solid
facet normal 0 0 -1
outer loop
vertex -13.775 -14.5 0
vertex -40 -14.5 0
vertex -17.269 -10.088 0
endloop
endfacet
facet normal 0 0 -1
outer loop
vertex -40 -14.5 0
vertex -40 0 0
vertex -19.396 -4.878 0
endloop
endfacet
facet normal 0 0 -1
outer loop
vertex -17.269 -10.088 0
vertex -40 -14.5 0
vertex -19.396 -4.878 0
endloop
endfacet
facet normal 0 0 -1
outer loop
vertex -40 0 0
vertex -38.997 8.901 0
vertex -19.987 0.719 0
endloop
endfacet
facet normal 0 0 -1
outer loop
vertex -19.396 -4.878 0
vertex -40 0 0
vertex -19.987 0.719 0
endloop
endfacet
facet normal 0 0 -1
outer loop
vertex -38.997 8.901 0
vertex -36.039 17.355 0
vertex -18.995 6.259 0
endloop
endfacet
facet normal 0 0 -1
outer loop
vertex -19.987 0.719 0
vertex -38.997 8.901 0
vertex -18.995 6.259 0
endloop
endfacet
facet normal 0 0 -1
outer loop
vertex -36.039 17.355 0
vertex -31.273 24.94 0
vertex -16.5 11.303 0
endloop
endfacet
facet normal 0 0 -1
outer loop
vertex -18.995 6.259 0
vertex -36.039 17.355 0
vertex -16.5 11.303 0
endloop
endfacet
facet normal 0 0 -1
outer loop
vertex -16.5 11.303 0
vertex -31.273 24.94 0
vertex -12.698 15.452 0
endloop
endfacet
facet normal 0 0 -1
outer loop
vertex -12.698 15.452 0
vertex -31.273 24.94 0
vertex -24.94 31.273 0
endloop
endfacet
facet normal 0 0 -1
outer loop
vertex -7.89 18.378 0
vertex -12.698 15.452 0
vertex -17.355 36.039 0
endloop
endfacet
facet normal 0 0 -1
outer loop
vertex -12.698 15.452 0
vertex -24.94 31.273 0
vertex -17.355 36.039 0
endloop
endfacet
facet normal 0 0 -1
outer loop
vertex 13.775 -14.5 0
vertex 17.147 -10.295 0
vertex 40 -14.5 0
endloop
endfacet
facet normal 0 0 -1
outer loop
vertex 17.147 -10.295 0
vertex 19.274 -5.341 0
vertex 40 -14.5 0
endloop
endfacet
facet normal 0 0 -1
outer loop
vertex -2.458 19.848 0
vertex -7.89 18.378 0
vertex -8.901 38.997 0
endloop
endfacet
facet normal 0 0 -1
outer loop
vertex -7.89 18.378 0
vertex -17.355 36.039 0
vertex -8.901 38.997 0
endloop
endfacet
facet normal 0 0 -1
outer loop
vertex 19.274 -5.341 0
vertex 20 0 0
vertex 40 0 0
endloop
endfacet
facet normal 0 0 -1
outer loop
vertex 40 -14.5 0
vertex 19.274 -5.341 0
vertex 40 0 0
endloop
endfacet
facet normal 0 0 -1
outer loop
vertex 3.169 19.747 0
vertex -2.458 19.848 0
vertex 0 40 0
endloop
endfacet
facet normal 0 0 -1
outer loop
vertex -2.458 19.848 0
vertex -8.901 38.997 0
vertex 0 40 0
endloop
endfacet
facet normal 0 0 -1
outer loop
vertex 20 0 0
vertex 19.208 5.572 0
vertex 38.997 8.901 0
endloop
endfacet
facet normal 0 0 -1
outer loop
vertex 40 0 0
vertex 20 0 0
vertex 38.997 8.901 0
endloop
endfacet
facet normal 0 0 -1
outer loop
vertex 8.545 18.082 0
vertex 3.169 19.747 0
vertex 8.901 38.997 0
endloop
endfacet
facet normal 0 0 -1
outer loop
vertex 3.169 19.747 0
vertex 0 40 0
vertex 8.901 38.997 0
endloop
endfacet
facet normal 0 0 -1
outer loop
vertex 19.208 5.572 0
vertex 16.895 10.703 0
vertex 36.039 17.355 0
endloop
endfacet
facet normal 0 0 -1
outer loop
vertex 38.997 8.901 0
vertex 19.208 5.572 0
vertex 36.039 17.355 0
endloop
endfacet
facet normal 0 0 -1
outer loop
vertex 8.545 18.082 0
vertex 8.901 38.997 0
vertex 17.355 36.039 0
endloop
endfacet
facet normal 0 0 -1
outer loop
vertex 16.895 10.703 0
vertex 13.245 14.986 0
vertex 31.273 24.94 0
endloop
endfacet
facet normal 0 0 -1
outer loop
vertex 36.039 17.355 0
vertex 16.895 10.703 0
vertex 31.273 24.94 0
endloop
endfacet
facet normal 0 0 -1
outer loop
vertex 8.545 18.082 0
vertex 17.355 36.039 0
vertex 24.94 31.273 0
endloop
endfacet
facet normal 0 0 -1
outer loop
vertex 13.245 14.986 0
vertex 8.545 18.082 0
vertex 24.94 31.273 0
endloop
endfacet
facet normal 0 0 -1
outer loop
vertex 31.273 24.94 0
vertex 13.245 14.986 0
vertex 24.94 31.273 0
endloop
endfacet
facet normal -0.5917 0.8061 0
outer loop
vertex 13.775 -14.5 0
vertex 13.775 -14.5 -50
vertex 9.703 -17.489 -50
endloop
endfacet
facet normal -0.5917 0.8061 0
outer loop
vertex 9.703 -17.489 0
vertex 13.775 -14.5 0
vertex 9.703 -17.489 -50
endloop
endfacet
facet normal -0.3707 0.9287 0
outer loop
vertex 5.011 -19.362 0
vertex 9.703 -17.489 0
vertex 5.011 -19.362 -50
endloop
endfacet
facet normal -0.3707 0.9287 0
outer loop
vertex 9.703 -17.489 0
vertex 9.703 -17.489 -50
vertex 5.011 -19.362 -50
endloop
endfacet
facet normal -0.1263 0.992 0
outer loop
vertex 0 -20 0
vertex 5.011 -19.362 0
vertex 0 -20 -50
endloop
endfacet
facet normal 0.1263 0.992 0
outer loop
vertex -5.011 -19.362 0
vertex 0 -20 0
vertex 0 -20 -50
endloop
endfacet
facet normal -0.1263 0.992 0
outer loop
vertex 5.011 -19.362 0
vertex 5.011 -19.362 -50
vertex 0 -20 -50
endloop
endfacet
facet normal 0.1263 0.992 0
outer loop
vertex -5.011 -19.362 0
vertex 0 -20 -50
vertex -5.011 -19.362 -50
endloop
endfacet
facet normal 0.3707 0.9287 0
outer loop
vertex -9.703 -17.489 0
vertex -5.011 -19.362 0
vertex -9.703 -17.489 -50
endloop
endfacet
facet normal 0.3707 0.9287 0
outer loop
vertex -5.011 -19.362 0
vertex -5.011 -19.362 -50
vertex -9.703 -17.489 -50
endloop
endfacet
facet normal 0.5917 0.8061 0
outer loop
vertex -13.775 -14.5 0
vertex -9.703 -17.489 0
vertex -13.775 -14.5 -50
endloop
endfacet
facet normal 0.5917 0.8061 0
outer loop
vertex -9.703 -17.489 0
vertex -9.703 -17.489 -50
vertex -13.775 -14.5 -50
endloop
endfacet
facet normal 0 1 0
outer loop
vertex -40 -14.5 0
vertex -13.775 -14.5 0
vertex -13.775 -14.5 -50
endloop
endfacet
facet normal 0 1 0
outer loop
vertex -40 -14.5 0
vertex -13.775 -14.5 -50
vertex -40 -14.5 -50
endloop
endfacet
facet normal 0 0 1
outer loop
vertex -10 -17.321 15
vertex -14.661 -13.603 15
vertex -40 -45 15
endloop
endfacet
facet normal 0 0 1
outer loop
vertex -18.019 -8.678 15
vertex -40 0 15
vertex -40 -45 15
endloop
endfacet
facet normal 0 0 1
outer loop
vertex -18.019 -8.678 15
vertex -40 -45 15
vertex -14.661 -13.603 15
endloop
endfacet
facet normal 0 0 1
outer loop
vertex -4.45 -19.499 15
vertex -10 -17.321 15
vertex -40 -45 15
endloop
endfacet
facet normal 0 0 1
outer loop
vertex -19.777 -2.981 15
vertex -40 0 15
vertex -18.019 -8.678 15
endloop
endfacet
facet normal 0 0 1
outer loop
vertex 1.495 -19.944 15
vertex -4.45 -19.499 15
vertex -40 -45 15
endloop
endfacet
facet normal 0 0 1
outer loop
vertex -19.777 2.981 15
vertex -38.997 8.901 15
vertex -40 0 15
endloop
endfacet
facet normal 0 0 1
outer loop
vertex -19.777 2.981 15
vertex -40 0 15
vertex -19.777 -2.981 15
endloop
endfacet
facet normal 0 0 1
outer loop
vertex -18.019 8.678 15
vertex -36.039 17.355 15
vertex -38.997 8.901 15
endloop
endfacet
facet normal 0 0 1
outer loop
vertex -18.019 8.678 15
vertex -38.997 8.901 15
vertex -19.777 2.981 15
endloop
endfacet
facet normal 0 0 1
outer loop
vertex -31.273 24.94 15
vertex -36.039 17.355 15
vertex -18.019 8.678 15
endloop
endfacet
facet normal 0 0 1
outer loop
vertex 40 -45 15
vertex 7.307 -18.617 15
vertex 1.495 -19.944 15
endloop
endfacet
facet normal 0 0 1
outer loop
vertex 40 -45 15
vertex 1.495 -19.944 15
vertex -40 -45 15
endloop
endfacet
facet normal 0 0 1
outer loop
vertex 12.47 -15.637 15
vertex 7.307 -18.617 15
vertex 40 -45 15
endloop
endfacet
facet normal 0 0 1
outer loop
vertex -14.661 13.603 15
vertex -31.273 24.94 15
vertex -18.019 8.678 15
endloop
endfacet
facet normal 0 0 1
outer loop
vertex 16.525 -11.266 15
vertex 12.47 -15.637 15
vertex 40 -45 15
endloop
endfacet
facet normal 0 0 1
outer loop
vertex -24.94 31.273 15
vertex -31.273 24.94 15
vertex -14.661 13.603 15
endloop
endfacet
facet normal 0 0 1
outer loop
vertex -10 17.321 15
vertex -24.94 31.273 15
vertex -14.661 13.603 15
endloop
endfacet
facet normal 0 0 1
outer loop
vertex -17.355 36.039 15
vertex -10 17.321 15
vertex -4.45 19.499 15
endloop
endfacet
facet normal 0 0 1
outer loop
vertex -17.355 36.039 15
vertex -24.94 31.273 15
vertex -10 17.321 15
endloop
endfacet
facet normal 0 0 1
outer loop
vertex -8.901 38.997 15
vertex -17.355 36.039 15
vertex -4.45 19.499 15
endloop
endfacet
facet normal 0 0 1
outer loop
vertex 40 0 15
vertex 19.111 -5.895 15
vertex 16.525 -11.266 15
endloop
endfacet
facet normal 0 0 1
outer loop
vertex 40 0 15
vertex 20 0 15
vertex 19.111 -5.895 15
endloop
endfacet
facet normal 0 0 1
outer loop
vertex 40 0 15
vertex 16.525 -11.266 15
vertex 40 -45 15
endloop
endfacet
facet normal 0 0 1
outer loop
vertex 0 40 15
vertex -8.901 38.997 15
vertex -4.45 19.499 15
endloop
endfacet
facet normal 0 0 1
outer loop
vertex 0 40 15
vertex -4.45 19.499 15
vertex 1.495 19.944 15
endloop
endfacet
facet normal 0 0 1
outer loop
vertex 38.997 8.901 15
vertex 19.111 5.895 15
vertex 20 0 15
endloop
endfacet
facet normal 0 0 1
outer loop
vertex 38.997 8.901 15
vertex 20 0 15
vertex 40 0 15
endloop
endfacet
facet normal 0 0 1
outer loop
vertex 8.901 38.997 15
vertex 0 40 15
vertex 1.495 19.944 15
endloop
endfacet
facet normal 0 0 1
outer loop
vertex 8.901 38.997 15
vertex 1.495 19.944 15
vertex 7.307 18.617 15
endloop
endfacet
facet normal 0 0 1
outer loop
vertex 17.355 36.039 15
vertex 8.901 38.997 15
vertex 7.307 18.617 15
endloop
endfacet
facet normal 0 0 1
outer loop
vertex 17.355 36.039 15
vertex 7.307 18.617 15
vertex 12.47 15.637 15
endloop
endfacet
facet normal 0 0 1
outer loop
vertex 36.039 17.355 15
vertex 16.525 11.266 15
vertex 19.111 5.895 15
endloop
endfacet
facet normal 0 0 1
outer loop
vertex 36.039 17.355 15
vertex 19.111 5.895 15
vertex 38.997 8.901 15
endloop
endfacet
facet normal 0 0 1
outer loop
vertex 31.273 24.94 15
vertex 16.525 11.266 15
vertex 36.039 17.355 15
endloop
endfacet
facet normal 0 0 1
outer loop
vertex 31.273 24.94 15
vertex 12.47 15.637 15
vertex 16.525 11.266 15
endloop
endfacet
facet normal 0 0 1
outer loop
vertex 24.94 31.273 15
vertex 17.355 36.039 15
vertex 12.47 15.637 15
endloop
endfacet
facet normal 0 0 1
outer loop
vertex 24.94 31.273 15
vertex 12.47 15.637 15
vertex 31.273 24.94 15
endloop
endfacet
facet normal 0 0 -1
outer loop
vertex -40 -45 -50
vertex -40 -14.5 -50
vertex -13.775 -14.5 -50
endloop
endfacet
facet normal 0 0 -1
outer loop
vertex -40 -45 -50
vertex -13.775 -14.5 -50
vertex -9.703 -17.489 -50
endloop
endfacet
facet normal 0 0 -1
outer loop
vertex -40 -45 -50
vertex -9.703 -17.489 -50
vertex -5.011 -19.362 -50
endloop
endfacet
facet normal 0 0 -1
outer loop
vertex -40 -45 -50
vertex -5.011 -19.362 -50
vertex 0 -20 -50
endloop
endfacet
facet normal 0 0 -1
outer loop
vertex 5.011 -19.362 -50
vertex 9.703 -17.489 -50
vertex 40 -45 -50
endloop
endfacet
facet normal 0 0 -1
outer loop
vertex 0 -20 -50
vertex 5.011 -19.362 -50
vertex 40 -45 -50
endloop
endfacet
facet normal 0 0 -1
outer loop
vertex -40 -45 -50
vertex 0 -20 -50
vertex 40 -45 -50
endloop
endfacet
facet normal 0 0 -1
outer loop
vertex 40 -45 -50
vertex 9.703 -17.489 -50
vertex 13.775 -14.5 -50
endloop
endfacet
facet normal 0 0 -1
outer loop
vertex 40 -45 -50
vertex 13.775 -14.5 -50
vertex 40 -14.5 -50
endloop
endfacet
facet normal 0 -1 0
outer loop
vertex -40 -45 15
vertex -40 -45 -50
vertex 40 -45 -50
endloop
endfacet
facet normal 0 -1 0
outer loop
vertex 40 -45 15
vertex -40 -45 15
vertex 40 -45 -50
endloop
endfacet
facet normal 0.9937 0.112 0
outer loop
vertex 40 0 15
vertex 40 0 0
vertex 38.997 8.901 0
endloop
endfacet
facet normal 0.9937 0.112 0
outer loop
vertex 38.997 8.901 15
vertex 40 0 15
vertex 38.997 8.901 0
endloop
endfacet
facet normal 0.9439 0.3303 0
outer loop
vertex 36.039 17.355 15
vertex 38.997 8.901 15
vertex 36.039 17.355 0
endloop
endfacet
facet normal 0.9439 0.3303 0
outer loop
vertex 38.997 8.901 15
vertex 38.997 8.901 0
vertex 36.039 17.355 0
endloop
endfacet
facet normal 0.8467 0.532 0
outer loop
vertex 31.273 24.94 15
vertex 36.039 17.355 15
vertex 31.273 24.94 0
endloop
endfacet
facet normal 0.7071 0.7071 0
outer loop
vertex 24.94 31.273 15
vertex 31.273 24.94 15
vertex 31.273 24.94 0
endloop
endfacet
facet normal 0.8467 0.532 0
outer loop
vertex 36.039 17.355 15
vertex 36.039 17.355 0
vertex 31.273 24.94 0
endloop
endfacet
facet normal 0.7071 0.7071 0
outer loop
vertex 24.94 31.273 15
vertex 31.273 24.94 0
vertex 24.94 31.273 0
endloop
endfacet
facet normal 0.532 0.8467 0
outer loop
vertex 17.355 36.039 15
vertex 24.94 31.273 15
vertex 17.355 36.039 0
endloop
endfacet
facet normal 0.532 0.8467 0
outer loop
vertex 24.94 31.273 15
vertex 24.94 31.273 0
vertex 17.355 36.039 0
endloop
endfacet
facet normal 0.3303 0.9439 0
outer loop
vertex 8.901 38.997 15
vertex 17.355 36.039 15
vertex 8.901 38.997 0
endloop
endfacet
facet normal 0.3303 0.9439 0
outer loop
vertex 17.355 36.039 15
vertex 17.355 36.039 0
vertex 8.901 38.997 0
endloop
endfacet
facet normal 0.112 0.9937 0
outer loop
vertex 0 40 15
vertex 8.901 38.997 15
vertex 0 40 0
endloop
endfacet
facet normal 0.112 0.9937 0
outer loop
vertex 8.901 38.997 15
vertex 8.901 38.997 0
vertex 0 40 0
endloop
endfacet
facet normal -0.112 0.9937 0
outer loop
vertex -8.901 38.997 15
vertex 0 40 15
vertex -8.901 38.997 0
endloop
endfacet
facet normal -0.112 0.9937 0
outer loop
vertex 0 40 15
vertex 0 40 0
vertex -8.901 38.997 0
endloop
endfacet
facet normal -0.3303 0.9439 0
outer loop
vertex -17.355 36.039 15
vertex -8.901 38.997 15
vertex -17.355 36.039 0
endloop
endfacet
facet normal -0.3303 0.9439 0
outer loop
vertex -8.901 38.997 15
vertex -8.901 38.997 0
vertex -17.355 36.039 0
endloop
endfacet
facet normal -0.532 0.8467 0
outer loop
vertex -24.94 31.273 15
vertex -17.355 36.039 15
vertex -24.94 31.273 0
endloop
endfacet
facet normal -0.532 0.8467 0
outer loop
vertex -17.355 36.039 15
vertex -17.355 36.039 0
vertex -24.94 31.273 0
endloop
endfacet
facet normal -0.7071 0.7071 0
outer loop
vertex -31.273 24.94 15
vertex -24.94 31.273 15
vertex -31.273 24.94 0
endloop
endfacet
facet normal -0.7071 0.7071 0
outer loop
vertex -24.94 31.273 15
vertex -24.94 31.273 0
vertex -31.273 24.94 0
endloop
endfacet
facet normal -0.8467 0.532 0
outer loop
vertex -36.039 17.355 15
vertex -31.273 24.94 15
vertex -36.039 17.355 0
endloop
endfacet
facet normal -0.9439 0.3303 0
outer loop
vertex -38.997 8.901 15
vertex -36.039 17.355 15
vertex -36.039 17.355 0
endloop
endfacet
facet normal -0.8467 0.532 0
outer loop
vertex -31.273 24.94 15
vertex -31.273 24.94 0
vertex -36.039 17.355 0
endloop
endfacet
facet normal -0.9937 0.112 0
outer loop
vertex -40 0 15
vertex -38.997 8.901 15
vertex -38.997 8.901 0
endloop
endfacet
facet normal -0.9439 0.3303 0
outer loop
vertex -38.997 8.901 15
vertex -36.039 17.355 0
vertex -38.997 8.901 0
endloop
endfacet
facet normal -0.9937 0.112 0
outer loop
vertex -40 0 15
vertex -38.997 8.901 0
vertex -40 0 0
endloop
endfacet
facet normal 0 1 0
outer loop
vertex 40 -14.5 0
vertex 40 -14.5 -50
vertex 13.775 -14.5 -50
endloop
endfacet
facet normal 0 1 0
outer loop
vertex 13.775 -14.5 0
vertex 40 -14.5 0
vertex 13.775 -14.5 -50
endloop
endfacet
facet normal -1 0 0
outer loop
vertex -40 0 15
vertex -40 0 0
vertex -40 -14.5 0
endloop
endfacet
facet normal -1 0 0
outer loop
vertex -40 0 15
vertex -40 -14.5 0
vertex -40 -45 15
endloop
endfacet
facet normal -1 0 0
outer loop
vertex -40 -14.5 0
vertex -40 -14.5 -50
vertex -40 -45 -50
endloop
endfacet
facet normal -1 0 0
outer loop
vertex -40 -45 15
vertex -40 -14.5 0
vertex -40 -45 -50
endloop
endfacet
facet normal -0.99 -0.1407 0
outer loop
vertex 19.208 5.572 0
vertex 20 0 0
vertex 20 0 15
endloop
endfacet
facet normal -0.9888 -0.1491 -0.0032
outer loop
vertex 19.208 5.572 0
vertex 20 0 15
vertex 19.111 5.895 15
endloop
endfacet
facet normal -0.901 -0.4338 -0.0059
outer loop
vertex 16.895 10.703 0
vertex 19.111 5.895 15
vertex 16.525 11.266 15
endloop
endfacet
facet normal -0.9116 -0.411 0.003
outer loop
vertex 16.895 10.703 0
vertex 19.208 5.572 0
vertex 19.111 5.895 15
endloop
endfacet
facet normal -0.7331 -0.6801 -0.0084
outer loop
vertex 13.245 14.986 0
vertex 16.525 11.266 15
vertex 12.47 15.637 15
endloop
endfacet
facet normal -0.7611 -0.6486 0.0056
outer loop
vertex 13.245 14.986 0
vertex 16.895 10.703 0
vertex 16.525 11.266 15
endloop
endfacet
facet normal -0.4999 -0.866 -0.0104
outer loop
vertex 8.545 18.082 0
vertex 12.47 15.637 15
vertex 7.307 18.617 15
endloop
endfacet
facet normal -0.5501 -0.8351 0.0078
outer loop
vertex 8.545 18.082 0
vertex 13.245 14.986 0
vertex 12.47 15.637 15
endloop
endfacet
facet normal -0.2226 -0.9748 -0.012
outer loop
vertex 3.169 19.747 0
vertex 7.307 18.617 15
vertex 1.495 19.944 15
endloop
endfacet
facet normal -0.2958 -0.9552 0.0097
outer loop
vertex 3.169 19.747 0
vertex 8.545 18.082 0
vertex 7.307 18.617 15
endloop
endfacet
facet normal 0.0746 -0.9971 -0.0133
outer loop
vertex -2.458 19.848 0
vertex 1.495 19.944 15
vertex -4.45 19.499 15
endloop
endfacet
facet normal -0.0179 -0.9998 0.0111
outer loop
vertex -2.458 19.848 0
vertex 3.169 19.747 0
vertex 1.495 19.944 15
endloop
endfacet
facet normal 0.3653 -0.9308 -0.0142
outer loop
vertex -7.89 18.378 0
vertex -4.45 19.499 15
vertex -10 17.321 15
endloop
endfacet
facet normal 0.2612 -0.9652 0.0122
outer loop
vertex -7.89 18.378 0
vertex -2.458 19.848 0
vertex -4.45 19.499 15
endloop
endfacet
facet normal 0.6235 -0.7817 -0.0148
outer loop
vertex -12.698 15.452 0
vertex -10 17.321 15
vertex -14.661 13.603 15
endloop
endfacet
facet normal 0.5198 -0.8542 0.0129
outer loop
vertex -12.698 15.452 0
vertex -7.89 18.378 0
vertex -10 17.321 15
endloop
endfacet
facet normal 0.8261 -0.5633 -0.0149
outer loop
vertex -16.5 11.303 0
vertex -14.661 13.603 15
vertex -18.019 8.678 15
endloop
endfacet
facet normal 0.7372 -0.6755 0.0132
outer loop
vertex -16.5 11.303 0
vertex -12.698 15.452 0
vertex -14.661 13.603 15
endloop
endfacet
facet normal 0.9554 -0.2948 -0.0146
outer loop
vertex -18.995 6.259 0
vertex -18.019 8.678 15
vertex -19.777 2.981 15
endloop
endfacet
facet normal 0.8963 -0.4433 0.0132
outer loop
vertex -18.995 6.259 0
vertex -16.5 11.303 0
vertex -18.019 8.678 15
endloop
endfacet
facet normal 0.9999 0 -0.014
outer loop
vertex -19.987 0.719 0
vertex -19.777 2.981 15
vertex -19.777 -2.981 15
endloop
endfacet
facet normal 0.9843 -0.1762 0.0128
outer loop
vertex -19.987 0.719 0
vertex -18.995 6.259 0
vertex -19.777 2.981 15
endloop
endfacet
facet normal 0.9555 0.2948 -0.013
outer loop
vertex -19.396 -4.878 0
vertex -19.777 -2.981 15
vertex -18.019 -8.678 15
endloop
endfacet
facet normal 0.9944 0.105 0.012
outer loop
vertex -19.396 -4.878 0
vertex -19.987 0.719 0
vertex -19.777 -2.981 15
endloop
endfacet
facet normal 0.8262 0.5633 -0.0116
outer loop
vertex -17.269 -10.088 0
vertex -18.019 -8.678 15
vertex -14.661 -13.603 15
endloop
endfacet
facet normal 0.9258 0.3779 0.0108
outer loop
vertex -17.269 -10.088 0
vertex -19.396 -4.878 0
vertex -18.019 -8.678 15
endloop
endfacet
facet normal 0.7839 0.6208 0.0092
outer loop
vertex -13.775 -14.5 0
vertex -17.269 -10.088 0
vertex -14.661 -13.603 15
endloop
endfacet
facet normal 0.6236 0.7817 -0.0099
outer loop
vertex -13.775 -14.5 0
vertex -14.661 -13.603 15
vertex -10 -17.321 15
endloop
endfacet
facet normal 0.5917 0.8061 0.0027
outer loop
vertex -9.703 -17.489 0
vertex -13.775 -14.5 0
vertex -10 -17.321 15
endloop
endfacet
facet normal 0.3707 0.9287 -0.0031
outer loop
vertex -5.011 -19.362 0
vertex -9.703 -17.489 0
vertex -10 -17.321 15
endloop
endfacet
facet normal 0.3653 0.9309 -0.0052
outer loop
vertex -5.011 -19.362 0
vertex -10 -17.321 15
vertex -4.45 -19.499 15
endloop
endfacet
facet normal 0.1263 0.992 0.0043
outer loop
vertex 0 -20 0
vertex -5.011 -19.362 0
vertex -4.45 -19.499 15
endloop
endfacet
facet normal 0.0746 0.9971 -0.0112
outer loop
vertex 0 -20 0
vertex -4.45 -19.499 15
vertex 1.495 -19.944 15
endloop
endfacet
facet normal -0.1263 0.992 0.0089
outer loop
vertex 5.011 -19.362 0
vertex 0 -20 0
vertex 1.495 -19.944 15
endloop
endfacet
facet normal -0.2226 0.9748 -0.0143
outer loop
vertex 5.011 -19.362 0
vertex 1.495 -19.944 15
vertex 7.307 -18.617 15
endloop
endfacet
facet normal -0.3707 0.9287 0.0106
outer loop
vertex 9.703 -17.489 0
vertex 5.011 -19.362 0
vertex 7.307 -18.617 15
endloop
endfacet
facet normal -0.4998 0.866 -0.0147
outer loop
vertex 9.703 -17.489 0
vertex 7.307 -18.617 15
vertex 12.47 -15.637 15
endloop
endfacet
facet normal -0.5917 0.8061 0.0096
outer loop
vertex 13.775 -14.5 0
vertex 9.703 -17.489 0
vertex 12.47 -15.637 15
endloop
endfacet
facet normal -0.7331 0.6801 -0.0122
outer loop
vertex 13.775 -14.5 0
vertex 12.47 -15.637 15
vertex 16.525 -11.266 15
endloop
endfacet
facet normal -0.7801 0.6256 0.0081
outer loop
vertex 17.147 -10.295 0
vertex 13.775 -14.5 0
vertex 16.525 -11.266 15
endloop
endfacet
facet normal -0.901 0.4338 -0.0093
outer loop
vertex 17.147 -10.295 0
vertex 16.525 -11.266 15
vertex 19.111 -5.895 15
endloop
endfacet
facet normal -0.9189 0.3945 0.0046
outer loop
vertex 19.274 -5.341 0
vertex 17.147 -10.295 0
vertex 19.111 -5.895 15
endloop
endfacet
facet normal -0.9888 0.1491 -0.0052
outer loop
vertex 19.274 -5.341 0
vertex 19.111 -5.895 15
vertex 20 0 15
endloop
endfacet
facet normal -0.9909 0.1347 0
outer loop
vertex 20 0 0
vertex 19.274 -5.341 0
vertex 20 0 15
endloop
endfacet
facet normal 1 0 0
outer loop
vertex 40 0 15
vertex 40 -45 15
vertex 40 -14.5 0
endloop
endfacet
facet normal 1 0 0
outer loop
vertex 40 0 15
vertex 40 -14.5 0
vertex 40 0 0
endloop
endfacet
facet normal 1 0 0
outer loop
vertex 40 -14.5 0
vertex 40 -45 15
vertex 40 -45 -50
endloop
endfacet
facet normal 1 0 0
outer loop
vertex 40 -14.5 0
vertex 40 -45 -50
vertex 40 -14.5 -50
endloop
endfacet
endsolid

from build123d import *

# Parameters (mm, degrees)
SKETCH1_R           = 40
SKETCH1_R_2         = 20
BOSS_EXTRUDE1_DEPTH = 15
BOSS_EXTRUDE2_START = 50
BOSS_EXTRUDE2_DEPTH = 50


with BuildPart() as part:
    # Sketch1 → Boss-Extrude1 (new body)
    # profile 1 of 2: a face of its own
    with BuildSketch(Plane.XY):
        Circle(SKETCH1_R)
        Circle(SKETCH1_R_2, mode=Mode.SUBTRACT)
    # profile 2 of 2: a face of its own
    with BuildSketch(Plane.XY):
        with BuildLine():
            ThreePointArc((40, 0), (0, -40), (-40, 0))
            Line((-40, 0), (-40, -45))
            Line((-40, -45), (40, -45))
            Line((40, -45), (40, 0))
        make_face()
    extrude(amount=BOSS_EXTRUDE1_DEPTH)

    # Sketch3 → Boss-Extrude2 (add)
    with BuildSketch(Plane(origin=(0, 0, 0), x_dir=(-1, 0, 0), z_dir=(0, 0, -1)).offset(BOSS_EXTRUDE2_START)):
        with BuildLine():
            Line((13.774977314, -14.5), (40, -14.5))
            Line((40, -14.5), (40, -45))
            Line((40, -45), (-40, -45))
            Line((-40, -45), (-40, -14.5))
            Line((-40, -14.5), (-13.774977314, -14.5))
            ThreePointArc((-13.774977314, -14.5), (0, -20), (13.774977314, -14.5))
        make_face()
    extrude(amount=-BOSS_EXTRUDE2_DEPTH)


solid = part.part
